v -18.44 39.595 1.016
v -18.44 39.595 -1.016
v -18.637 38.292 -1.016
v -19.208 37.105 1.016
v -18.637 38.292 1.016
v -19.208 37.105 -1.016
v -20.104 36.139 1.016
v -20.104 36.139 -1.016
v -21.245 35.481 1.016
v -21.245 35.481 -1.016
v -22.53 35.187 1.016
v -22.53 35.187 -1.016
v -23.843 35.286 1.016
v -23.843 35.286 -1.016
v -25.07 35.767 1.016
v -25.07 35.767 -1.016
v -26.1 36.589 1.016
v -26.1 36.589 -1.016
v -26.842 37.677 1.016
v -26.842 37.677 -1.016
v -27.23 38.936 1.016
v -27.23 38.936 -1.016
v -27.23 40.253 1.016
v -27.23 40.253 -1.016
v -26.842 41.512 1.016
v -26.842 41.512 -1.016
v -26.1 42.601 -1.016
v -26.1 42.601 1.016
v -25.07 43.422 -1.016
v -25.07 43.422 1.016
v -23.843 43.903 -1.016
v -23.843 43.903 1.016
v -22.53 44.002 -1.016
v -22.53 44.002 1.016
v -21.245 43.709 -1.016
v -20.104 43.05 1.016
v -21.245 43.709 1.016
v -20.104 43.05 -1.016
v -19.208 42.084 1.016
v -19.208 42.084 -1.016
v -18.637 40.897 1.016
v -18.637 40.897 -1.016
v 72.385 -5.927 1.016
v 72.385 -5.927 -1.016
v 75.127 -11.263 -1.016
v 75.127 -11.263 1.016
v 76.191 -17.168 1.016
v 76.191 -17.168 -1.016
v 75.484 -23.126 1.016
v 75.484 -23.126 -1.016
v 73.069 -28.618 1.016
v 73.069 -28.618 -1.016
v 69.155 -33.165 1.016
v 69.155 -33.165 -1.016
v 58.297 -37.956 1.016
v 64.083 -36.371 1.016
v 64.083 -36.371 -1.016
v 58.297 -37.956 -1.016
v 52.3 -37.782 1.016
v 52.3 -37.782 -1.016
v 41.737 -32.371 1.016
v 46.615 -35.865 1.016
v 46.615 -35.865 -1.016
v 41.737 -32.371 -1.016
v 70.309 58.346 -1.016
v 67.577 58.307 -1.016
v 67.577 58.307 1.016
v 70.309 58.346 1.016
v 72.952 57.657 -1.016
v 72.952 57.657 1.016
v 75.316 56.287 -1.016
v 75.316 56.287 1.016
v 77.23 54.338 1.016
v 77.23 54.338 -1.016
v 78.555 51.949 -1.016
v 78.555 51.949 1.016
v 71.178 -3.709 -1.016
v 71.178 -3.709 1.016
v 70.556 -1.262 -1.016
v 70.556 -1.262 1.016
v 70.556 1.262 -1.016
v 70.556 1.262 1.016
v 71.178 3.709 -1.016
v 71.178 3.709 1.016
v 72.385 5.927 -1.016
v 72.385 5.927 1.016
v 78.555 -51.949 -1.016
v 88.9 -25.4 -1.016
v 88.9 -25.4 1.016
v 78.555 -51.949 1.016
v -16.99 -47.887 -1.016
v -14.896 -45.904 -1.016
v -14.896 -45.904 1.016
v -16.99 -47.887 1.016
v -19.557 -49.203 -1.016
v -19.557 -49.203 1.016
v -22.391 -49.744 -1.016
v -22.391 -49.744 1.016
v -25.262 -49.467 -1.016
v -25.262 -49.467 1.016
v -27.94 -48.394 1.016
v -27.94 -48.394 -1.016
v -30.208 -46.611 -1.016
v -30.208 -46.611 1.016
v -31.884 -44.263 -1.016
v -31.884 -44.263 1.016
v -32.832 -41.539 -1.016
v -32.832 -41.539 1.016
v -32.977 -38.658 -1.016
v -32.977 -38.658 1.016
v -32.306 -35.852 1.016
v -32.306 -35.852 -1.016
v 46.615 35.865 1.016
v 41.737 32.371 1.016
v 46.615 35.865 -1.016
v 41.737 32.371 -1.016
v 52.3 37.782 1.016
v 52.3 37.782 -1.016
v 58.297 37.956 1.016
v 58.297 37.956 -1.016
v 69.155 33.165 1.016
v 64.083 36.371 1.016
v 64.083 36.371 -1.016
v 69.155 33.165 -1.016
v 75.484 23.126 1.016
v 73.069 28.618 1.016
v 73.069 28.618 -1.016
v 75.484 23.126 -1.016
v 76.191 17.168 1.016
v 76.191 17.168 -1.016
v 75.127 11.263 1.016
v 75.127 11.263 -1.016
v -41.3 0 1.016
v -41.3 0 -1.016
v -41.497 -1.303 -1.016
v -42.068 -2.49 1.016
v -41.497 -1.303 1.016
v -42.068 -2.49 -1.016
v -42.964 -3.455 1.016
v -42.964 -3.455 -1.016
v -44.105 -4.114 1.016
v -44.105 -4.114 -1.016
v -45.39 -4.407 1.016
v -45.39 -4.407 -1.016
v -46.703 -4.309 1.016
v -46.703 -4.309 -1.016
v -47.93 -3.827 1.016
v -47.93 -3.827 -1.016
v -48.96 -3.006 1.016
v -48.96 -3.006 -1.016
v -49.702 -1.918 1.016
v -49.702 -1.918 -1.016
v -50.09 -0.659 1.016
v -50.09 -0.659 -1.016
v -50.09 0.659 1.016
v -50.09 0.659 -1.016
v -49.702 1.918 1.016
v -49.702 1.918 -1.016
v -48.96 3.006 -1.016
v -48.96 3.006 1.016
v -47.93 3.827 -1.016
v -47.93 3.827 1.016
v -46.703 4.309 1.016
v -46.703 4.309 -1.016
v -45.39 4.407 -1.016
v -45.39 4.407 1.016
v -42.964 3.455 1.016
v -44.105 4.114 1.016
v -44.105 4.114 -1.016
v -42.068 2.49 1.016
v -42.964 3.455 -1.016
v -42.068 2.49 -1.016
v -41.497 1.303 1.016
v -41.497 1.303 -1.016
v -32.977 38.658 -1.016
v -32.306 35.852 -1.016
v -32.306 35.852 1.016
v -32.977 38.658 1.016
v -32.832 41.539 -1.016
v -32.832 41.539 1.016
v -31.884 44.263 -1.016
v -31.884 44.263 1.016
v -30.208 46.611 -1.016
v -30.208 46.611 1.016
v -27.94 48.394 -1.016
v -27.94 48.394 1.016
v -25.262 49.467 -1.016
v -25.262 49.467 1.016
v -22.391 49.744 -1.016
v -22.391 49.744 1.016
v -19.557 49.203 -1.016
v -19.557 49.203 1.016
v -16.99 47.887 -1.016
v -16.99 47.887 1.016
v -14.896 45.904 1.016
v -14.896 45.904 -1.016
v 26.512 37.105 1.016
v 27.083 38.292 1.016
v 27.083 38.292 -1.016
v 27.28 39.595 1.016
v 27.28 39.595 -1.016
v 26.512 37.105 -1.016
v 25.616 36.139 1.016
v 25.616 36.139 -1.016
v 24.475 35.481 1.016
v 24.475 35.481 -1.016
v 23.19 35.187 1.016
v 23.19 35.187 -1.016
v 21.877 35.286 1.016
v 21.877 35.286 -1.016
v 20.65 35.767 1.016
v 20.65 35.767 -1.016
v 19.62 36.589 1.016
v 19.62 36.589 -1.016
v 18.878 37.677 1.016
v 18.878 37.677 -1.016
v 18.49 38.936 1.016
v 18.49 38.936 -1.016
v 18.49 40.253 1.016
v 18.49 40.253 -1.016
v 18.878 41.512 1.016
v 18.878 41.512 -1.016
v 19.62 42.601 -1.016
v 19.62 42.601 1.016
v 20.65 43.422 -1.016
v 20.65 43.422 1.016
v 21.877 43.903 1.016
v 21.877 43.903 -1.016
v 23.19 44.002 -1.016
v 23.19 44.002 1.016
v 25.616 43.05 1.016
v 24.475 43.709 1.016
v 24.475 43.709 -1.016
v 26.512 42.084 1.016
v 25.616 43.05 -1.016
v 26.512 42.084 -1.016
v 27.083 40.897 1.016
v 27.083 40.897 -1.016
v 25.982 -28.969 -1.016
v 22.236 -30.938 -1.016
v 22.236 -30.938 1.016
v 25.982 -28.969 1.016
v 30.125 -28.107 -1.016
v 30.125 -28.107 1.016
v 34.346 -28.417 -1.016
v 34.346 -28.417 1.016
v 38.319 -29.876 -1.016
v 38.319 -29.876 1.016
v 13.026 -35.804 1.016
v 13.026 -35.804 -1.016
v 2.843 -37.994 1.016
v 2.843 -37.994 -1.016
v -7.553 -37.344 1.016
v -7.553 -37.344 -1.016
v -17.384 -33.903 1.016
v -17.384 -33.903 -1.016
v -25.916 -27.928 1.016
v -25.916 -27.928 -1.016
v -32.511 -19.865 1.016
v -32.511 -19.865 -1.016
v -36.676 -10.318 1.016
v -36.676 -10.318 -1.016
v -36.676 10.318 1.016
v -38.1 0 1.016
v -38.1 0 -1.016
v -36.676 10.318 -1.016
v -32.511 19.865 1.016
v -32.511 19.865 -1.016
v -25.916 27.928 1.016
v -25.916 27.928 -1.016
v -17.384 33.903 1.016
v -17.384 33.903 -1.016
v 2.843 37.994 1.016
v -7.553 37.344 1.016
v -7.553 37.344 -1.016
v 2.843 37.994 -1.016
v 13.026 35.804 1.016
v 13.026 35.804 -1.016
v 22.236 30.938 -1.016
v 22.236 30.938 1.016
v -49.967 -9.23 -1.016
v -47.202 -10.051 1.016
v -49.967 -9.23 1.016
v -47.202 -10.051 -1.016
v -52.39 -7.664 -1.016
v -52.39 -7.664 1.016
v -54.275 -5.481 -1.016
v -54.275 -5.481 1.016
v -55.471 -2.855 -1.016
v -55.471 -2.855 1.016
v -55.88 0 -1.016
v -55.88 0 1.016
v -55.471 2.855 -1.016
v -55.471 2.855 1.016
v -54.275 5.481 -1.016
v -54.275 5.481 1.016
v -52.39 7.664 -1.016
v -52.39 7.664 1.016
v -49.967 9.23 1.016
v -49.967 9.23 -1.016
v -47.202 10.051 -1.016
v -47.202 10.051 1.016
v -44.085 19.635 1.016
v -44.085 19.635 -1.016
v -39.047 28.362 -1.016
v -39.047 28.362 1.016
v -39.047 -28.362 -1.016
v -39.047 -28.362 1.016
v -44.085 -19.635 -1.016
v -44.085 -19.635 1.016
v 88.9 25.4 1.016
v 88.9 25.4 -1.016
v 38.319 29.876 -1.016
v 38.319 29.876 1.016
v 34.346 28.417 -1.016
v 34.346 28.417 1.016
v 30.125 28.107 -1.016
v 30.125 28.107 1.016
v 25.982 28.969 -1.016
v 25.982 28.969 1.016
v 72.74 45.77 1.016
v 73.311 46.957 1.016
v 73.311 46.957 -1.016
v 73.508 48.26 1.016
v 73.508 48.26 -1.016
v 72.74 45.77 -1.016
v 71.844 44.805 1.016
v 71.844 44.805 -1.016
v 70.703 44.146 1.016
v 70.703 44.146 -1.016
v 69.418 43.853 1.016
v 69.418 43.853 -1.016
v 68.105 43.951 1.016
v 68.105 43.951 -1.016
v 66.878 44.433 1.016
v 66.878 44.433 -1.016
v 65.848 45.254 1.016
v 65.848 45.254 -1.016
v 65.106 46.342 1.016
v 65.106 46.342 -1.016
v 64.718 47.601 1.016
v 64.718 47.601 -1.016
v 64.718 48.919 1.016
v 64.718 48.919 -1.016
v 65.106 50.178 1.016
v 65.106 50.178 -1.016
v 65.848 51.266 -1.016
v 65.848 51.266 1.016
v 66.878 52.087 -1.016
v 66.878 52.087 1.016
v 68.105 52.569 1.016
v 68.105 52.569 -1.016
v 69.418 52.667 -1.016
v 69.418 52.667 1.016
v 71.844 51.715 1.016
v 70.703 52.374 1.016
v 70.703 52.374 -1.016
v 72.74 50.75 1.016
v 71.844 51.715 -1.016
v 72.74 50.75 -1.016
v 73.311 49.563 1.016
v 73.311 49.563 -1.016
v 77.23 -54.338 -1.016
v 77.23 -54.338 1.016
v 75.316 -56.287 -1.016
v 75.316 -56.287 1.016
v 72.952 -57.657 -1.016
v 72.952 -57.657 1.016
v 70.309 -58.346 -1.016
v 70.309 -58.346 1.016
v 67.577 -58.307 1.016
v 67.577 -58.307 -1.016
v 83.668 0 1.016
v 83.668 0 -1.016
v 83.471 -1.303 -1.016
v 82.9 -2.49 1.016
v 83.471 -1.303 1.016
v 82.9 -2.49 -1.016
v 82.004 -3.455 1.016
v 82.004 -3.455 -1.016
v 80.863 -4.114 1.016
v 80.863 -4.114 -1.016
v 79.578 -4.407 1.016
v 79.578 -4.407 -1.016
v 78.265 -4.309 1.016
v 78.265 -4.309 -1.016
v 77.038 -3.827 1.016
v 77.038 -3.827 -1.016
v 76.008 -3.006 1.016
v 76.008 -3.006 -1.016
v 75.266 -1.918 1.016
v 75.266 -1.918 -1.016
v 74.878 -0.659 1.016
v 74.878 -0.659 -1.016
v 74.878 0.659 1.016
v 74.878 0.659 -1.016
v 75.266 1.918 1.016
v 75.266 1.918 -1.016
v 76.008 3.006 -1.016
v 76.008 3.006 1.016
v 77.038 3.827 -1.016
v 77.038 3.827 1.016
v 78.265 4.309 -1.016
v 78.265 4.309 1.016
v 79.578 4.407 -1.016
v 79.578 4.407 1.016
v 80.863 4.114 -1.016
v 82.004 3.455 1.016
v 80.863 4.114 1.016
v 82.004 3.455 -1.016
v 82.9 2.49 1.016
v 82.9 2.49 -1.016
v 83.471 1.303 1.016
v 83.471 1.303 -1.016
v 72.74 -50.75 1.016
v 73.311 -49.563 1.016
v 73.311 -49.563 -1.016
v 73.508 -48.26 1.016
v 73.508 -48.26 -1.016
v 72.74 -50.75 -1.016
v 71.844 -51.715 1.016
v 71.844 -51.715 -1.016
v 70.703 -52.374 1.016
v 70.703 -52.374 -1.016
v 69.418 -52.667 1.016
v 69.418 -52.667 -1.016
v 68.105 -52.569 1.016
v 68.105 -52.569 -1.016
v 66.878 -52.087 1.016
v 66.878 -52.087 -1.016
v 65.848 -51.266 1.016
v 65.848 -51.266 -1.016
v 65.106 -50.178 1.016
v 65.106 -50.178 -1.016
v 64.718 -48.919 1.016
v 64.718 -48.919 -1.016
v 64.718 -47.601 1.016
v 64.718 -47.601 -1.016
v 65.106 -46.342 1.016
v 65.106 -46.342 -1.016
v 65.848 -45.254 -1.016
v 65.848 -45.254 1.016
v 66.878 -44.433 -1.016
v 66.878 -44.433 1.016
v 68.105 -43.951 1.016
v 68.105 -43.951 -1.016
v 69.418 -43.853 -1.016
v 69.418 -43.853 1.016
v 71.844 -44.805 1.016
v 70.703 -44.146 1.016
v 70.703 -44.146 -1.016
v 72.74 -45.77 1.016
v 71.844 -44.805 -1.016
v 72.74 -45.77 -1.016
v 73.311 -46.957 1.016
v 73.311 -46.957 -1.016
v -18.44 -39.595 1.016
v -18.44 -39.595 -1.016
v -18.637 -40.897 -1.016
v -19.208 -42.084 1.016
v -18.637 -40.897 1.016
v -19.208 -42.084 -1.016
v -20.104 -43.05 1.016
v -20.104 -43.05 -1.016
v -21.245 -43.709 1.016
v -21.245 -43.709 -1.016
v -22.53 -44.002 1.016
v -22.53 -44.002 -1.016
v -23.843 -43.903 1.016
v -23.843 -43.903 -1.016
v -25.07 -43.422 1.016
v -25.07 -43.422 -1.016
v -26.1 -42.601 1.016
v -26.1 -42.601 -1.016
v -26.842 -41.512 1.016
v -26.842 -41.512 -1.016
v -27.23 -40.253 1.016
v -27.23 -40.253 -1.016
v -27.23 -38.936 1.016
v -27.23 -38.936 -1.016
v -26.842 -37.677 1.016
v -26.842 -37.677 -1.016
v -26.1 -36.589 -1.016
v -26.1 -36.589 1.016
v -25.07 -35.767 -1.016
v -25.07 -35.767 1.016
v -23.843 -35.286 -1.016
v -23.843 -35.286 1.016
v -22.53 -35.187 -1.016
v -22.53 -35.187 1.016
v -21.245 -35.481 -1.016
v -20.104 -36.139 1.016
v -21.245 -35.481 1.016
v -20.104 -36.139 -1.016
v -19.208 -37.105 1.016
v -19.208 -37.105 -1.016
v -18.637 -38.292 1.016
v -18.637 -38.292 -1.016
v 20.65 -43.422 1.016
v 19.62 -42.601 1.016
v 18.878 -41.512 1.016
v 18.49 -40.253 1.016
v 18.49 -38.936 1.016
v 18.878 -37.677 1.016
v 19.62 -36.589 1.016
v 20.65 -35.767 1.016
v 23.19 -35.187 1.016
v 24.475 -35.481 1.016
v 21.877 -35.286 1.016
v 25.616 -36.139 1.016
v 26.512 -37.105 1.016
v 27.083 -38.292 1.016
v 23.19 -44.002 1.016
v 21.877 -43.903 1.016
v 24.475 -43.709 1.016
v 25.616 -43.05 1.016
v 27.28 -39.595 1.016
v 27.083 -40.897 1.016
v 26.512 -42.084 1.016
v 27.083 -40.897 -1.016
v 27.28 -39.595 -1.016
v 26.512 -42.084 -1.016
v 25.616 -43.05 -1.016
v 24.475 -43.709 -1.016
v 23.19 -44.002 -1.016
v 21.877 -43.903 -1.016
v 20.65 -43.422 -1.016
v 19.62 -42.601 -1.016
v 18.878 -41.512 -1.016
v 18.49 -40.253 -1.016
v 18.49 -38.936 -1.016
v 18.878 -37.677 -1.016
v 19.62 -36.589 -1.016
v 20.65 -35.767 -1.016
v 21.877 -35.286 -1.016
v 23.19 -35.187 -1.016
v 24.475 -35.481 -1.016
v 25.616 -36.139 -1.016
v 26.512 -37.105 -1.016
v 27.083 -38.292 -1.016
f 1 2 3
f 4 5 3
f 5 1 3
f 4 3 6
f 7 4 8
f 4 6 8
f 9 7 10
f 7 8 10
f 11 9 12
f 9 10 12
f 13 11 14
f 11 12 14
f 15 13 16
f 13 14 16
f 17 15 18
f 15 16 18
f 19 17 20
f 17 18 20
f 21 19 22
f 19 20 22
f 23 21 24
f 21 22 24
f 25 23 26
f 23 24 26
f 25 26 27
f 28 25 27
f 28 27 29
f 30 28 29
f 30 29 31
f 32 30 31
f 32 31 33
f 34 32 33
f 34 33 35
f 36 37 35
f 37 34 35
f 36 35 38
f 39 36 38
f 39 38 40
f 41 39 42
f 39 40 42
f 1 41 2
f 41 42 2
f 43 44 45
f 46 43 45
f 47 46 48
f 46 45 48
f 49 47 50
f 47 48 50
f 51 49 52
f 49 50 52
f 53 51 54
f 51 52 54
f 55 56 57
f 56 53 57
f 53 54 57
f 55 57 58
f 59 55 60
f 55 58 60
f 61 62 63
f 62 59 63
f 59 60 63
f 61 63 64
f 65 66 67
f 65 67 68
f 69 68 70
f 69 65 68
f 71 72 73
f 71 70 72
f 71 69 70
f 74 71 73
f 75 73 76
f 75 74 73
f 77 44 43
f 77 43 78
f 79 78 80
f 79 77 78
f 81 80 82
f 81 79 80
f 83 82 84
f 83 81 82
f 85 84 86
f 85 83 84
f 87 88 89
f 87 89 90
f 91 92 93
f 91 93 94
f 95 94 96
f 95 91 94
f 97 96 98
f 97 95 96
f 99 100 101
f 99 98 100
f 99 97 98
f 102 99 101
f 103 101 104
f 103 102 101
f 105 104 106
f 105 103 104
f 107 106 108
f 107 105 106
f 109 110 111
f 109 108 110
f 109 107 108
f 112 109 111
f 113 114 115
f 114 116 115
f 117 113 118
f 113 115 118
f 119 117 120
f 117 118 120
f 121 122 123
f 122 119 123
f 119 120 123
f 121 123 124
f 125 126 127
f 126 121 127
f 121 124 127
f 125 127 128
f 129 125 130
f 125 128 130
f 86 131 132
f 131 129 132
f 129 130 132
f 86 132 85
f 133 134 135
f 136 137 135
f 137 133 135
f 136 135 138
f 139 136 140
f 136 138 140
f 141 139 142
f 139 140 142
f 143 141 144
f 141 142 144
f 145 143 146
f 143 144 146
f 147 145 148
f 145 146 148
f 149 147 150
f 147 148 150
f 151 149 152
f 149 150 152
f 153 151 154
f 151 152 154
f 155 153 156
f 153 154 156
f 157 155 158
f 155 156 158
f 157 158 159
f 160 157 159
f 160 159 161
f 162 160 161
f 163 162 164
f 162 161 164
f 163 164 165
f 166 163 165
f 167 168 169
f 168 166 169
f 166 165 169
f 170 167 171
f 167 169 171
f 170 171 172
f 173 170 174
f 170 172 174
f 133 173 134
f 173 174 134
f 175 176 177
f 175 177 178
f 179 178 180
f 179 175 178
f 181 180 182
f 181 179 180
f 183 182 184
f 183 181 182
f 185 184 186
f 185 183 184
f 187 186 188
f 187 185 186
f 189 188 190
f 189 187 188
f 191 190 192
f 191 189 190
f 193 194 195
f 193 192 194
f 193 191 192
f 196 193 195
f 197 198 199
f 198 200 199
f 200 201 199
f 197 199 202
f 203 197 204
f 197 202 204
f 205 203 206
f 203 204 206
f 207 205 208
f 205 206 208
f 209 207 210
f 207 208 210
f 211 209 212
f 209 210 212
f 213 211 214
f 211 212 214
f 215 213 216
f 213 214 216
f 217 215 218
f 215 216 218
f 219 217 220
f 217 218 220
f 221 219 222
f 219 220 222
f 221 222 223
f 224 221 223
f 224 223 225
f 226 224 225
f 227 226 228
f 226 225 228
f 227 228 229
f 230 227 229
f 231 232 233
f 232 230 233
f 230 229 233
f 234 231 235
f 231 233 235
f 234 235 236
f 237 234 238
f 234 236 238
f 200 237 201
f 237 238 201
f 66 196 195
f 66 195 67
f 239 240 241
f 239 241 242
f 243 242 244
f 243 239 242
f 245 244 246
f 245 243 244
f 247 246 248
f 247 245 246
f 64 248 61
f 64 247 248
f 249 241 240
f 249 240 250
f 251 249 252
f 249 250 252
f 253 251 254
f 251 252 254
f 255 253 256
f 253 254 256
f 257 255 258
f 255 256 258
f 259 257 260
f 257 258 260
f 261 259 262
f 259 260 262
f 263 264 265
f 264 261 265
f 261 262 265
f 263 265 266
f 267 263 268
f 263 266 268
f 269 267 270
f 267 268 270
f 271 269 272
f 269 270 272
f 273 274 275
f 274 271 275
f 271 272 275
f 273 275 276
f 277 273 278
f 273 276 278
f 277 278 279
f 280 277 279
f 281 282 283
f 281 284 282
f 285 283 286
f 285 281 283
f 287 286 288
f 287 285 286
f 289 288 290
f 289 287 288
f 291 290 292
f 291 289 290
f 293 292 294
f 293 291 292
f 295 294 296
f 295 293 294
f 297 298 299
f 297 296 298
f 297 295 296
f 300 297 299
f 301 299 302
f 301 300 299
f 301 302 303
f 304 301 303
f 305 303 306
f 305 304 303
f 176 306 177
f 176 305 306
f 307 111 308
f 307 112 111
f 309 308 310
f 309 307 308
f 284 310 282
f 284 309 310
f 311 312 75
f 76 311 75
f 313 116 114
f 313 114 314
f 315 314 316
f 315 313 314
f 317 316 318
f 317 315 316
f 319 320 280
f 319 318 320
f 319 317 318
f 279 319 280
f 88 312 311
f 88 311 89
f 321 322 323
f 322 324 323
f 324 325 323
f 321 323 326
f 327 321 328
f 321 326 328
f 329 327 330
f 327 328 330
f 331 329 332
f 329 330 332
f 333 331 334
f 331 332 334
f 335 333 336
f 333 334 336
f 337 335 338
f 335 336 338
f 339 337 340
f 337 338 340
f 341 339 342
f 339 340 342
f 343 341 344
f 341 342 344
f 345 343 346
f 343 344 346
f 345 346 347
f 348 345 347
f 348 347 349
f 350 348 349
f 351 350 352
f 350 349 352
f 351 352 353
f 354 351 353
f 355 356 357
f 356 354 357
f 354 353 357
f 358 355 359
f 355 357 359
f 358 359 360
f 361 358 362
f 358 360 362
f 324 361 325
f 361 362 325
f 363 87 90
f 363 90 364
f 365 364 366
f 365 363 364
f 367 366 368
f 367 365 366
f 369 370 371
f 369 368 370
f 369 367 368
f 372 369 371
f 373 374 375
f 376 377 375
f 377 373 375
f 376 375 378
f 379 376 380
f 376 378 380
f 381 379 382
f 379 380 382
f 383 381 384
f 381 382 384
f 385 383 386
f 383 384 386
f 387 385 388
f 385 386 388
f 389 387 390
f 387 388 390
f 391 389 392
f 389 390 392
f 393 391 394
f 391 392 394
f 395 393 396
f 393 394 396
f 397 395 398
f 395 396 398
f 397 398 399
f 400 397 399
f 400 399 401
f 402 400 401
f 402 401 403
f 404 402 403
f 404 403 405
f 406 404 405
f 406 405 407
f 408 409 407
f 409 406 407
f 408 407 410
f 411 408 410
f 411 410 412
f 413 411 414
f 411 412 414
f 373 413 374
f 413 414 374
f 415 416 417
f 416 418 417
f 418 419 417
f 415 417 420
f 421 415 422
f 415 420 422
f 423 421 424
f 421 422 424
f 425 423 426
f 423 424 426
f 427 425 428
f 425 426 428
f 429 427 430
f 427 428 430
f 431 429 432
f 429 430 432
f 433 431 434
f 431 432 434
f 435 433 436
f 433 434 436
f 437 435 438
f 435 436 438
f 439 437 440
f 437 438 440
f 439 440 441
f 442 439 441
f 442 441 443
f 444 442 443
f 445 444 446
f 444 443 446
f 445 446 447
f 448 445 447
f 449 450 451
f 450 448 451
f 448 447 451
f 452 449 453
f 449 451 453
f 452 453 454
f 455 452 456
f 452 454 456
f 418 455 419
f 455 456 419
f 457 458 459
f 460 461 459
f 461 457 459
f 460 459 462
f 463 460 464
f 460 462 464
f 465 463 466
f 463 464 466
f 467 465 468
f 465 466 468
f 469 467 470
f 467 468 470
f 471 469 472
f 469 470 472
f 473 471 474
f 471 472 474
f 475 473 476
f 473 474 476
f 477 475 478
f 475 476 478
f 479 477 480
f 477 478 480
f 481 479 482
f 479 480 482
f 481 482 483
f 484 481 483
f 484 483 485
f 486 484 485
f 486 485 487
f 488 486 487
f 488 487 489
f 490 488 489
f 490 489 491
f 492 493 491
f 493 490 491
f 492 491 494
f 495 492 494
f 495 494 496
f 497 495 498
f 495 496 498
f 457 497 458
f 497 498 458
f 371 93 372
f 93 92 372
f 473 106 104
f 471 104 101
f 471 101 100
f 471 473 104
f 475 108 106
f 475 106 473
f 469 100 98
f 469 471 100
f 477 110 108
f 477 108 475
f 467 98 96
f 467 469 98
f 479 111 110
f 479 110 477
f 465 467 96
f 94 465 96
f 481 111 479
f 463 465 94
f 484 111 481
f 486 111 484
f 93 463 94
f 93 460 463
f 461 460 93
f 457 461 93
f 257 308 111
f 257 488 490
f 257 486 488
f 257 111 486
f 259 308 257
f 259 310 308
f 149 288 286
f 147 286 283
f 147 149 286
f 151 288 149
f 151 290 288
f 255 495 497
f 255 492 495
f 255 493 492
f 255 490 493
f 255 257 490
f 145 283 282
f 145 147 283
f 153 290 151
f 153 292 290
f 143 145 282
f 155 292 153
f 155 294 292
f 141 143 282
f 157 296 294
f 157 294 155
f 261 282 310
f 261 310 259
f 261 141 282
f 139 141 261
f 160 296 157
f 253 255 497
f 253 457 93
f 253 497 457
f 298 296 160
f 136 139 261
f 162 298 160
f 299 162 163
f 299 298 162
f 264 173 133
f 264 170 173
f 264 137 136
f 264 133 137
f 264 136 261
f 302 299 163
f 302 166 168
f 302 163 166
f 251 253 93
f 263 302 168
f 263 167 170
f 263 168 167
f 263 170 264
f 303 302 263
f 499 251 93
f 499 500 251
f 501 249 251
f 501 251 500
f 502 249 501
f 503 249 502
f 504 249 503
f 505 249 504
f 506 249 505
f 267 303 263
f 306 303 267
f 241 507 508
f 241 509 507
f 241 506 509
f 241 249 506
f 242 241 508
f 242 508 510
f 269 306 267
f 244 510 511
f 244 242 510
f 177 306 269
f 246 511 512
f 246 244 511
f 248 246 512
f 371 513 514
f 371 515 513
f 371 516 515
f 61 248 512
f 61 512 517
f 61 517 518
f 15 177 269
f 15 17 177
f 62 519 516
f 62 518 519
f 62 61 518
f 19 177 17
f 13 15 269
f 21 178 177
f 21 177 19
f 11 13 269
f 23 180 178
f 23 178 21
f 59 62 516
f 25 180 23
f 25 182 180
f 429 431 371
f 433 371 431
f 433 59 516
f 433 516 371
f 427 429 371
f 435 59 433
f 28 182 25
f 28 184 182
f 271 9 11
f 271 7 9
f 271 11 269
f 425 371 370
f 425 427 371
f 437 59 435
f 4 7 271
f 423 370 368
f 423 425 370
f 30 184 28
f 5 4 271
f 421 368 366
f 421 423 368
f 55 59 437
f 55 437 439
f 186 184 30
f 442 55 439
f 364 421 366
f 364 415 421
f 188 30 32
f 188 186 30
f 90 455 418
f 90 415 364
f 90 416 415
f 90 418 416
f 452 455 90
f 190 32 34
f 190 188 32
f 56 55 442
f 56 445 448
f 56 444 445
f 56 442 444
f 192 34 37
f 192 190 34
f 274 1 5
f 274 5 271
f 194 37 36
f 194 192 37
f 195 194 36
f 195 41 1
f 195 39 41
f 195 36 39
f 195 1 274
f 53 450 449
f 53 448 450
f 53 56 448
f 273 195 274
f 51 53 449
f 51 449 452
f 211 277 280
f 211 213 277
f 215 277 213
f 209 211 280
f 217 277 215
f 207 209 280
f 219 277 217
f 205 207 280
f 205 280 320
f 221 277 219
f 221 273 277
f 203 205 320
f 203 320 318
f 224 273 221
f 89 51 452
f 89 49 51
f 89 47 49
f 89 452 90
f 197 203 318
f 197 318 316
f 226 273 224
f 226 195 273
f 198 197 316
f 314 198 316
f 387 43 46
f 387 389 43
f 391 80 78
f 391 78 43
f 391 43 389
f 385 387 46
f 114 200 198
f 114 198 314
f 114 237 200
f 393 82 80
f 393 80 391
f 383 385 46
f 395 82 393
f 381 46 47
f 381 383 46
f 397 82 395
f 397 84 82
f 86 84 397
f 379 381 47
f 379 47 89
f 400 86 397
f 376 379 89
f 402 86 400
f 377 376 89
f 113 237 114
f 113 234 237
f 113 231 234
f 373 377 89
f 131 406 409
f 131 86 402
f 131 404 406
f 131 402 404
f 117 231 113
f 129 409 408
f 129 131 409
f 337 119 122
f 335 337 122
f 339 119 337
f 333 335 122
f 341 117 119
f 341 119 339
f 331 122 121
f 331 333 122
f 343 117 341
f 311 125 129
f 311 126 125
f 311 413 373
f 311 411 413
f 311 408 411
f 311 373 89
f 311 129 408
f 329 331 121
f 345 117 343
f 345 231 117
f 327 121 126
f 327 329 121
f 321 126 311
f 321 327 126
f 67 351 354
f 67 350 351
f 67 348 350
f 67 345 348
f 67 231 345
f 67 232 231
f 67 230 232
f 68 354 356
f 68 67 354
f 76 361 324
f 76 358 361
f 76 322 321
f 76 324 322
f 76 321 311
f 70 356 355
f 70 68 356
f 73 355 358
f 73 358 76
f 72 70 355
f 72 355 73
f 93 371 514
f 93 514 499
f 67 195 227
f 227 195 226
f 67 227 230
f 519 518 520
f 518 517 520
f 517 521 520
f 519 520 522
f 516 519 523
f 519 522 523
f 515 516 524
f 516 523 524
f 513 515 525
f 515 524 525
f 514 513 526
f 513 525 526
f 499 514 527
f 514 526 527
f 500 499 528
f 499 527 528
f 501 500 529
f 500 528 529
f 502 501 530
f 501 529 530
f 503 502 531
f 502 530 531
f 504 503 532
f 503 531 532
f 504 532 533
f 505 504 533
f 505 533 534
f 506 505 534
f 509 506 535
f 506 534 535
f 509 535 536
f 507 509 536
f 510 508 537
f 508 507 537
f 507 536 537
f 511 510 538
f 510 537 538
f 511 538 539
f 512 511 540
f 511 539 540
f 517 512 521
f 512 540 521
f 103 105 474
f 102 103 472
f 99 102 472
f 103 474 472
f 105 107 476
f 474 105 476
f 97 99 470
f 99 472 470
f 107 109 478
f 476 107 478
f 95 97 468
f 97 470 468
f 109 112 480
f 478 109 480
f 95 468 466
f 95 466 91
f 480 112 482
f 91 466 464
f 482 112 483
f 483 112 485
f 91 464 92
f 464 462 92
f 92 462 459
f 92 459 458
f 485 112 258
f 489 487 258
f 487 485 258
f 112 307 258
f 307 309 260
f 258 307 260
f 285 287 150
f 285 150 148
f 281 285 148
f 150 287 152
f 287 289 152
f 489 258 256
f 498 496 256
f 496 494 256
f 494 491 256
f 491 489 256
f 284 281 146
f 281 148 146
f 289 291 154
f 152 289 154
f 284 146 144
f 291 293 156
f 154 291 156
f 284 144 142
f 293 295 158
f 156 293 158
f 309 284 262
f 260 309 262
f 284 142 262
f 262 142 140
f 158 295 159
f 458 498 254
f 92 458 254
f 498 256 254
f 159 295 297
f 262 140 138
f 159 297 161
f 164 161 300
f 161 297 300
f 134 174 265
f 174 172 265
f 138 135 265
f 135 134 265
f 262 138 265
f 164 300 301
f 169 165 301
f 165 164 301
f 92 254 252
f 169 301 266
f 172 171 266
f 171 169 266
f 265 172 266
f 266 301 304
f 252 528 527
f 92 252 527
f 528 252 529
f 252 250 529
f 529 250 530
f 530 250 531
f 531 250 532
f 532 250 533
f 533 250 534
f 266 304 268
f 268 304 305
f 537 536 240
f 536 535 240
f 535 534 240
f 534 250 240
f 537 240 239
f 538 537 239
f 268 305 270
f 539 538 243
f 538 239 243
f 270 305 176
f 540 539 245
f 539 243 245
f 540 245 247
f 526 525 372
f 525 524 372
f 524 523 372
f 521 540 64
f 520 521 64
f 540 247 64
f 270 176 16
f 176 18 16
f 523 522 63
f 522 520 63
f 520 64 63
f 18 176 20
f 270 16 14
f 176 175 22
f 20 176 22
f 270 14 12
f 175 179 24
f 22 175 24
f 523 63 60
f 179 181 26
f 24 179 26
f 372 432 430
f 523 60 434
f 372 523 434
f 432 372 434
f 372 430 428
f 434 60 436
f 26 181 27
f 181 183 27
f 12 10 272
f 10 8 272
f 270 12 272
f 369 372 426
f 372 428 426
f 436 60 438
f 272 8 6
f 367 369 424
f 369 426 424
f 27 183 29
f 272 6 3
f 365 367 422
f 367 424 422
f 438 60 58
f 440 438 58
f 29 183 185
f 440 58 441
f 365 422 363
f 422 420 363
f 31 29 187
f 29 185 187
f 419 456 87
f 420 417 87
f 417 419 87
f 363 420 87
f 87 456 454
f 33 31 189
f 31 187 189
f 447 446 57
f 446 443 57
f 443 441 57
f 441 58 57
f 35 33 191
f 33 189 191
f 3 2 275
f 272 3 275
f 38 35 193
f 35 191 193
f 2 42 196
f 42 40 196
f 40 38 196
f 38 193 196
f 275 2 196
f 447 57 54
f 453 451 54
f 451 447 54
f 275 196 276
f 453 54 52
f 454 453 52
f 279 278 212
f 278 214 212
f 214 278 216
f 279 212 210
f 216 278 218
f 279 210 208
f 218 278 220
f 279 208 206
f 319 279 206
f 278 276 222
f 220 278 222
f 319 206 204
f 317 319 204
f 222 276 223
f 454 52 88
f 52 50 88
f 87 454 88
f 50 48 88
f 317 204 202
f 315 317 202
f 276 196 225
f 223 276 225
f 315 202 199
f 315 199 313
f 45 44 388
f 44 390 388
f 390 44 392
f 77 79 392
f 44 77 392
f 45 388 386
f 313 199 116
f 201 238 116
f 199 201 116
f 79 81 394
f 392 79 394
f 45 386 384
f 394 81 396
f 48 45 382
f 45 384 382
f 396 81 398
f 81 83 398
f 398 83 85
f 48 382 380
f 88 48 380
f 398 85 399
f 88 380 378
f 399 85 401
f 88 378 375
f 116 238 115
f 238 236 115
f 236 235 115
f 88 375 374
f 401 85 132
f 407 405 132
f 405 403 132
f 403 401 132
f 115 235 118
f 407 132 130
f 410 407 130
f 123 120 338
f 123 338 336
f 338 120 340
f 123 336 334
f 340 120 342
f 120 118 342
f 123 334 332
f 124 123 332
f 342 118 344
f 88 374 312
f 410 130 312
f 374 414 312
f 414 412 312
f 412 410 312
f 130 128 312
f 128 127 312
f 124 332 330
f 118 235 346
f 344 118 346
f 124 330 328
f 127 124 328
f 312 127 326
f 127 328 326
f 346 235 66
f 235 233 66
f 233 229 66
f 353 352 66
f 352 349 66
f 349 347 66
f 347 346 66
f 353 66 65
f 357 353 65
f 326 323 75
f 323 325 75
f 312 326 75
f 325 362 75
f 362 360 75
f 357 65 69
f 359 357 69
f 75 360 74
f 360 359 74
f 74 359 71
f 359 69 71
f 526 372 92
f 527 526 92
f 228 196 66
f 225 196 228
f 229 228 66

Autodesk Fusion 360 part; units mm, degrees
sketch "Sketch1" plane through (0, 0, 0) normal (0, 0, 1) x (1, 0, 0)
  circle A0 centre (0, 0) radius 45.72 construction
  circle A1 centre (22.86, 39.5947) radius 4.4196
  line L0 (0, 0) -> (0, 63.5) construction
  line L1 (22.86, 39.5947) -> (0, 0) construction
  line L2 (0, 0) -> (69.088, 0) construction
  circle A2 centre (-22.86, 39.5947) radius 4.4196
  circle A3 centre (-45.72, 0) radius 4.4196
  circle A4 centre (-22.86, -39.5947) radius 4.4196
  circle A5 centre (22.86, -39.5947) radius 4.4196
  arc A6 (-14.8961, 45.9035) -> (-32.3056, 35.8522) centre (-22.86, 39.5947) ccw
  arc A7 (-47.2017, 10.0514) -> (-47.2017, -10.0514) centre (-45.72, 0) ccw
  arc A8 (-32.3056, -35.8522) -> (-14.8961, -45.9035) centre (-22.86, -39.5947) ccw
  line L3 (55.88, 55.88) -> (55.88, -43.18) construction
  arc A9 (22.2359, 30.9383) -> (41.7373, 32.3706) centre (31.1302, 43.3136) ccw
  arc A10 (45.7196, 0.1826) -> (46.0426, 0) centre (55.88, 17.78) ccw
  arc A11 (72.3846, 5.9267) -> (41.7373, 32.3706) centre (55.88, 17.78) ccw
  circle A12 centre (69.088, 48.26) radius 4.4196
  line L4 (-14.8961, 45.9035) -> (67.577, 58.307)
  line L5 (88.9, 25.4) -> (88.9, -25.4)
  line L6 (88.9, 25.4) -> (78.5547, 51.9489)
  circle A13 centre (79.248, 0) radius 4.4196
  arc A14 (22.2359, 30.9383) -> (22.2359, -30.9383) centre (0, 0) ccw
  arc A15 (0.7353, 48.2544) -> (0, 48.26) centre (0, 0) ccw
  arc A16 (78.5547, 51.9489) -> (67.577, 58.307) centre (69.088, 48.26) ccw
  line L7 (-14.8961, -45.9035) -> (67.577, -58.307)
  arc A17 (67.577, -58.307) -> (78.5547, -51.9489) centre (69.088, -48.26) ccw
  line L8 (88.9, -25.4) -> (78.5547, -51.9489)
  arc A18 (41.7373, -32.3706) -> (72.3846, -5.9267) centre (55.88, -17.78) ccw
  arc A19 (41.7373, -32.3706) -> (22.2359, -30.9383) centre (31.1302, -43.3136) ccw
  arc A20 (-32.3056, 35.8522) -> (-47.2017, 10.0514) centre (0, 0) ccw
  arc A21 (-47.2017, -10.0514) -> (-32.3056, -35.8522) centre (0, 0) ccw
  circle A22 centre (69.088, -48.26) radius 4.4196
  arc A23 (72.3846, 5.9267) -> (72.3846, -5.9267) centre (80.6369, 0) ccw
  dimension "d2" = 91.44
  dimension "d3" = 76.2
  dimension "d4" = 8.8392
  dimension "d5" = 30
  dimension "d7" = 240
  dimension "d13" = 55.88
  dimension "d14" = 40.64
  dimension "d15" = 17.78
  dimension "d16" = 30.48
  dimension "d17" = 8.8392
  dimension "d18" = 48.26
  dimension "d19" = 69.088
  dimension "d20" = 20.32
  dimension "d21" = 134.62
  dimension "d22" = 25.4
  dimension "d23" = 8.8392
  dimension "d24" = 79.248
  dimension "d28" = 20.32
extrude "Extrude1" add sketch "Sketch1" along normal mid plane 2.032
